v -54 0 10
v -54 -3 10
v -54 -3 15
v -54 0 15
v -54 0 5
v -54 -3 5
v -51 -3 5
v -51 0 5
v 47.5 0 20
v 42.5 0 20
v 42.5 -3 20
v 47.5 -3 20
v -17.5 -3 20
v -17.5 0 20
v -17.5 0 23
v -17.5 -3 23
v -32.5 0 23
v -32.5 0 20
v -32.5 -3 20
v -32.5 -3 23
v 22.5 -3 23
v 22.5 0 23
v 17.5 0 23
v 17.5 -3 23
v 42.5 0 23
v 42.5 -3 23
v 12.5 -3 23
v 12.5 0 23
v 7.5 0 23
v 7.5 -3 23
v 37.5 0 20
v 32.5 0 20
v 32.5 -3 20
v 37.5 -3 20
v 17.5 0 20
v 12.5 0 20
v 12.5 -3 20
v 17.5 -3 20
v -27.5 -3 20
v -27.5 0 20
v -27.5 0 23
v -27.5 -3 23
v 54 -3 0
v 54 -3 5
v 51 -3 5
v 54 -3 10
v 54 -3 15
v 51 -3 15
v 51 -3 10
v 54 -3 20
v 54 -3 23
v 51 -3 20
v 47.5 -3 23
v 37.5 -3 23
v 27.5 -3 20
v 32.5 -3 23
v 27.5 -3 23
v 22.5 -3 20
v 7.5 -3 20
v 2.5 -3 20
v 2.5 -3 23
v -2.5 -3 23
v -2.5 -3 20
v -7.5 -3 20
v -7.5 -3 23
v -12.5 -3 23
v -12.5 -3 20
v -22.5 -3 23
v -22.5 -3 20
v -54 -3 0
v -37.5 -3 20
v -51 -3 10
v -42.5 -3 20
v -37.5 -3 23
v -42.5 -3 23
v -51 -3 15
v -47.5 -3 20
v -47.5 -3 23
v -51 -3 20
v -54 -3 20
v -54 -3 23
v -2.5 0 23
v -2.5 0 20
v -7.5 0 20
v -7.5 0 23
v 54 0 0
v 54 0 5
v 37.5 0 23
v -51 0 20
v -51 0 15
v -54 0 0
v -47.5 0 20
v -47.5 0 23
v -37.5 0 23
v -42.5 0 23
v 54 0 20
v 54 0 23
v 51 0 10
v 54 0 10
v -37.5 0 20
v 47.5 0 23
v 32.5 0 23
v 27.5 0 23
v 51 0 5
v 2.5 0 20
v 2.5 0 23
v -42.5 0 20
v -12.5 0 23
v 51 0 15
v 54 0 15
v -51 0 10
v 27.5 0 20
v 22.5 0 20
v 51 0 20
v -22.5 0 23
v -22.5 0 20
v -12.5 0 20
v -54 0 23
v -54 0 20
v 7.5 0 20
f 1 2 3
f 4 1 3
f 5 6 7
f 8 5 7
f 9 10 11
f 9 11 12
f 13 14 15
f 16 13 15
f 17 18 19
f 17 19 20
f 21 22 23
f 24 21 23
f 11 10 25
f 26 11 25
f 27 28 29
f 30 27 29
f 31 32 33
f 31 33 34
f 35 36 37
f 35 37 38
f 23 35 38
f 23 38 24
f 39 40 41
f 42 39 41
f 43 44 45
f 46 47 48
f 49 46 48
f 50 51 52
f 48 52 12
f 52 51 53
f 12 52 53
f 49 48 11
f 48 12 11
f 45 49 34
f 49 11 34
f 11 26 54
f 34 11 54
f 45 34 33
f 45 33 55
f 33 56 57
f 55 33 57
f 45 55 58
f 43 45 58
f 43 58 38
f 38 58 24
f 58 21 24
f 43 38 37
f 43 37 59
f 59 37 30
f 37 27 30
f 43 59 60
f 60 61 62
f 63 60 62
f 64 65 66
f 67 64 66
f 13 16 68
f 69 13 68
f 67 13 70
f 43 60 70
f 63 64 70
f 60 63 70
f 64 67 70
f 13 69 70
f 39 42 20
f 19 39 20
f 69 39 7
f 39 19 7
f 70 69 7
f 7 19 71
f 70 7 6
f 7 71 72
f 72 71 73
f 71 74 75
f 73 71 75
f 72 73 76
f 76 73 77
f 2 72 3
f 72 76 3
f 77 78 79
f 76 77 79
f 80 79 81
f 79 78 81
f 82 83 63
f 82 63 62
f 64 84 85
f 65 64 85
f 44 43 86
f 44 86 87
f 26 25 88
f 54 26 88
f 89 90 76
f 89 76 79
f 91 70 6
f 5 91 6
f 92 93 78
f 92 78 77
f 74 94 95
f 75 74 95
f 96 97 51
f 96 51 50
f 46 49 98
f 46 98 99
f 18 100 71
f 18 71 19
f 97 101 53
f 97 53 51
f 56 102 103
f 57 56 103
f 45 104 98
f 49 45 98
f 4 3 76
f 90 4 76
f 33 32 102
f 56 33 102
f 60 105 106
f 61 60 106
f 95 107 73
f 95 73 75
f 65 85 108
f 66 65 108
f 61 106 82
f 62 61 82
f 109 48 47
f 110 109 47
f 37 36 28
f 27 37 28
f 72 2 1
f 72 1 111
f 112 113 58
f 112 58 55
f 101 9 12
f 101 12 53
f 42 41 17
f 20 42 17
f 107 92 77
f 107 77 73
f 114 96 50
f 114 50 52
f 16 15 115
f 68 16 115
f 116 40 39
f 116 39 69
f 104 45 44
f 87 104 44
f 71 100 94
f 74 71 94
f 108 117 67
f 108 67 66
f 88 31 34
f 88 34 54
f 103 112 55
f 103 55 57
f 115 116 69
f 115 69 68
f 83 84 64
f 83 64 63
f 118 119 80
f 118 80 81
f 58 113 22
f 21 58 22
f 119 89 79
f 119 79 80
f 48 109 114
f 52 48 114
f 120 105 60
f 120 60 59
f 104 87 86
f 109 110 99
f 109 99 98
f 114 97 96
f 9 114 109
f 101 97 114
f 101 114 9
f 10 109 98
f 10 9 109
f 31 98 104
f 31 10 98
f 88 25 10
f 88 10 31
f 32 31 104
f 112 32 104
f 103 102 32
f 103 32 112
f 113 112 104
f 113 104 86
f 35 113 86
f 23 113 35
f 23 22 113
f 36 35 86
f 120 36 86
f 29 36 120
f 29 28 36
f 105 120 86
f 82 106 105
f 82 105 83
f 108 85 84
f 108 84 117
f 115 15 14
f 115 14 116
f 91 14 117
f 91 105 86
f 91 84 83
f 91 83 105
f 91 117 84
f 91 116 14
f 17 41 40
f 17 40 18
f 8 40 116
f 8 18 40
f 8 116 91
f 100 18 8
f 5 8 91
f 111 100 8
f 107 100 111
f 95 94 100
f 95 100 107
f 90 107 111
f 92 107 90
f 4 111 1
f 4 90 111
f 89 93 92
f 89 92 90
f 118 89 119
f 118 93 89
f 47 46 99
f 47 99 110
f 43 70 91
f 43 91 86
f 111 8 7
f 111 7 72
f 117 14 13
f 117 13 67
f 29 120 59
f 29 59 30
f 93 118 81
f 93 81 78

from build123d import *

# Parameters (mm, degrees)
F0_W     = 102
F0_H     = 40
F1_DEPTH = 3
F2_W     = 3
F2_H     = 5
F3_DEPTH = 3
F4_W     = 5
F4_H     = 3
F5_DEPTH = 3
F6_W     = 108
F6_H     = 20
F7_DEPTH = 25


with BuildPart() as f1:
    # F0 (on Front) → F1 (new body)
    with BuildSketch(Plane.XZ):
        Rectangle(F0_W, F0_H)
    extrude(amount=F1_DEPTH)

    # F2 (on face) → F3 (join)
    with BuildSketch(Plane.XZ.offset(3)):
        with Locations((-52.5, -17.5)):
            Rectangle(F2_W, F2_H)
        with Locations((-52.5, -7.5)):
            Rectangle(F2_W, F2_H)
        with Locations((-52.5, 2.5)):
            Rectangle(F2_W, F2_H)
        with Locations((-52.5, 12.5)):
            Rectangle(F2_W, F2_H)
        with Locations((52.5, -7.5)):
            Rectangle(F2_W, F2_H)
        with Locations((52.5, -17.5)):
            Rectangle(F2_W, F2_H)
        with Locations((52.5, 12.5)):
            Rectangle(F2_W, F2_H)
        with Locations((52.5, 2.5)):
            Rectangle(F2_W, F2_H)
    extrude(amount=-F3_DEPTH)

    # F4 (on face) → F5 (join)
    with BuildSketch(Plane(origin=(0, 0, 0), x_dir=(-1, 0, 0), z_dir=(0, 1, 0))):
        with Locations((0, 21.5)):
            Rectangle(F4_W, F4_H)
        with Locations((10, 21.5)):
            Rectangle(F4_W, F4_H)
        with Locations((20, 21.5)):
            Rectangle(F4_W, F4_H)
        with Locations((30, 21.5)):
            Rectangle(F4_W, F4_H)
        with Locations((40, 21.5)):
            Rectangle(F4_W, F4_H)
        Polygon((52.5, 23), (47.5, 23), (47.5, 20), (52.5, 20), (54, 20), (54, 23), align=None)
        Polygon((-52.5, 20), (-47.5, 20), (-47.5, 23), (-52.5, 23), (-54, 23), (-54, 20), align=None)
        with Locations((-20, 21.5)):
            Rectangle(F4_W, F4_H)
        with Locations((-10, 21.5)):
            Rectangle(F4_W, F4_H)
        with Locations((-30, 21.5)):
            Rectangle(F4_W, F4_H)
        with Locations((-40, 21.5)):
            Rectangle(F4_W, F4_H)
    extrude(amount=-F5_DEPTH)

    # F6 (on face) → F7 (cut)
    with BuildSketch(Plane(origin=(0, 0, 0), x_dir=(-1, 0, 0), z_dir=(0, 1, 0))):
        with Locations((0, -10)):
            Rectangle(F6_W, F6_H)
    extrude(amount=-F7_DEPTH, mode=Mode.SUBTRACT)


solid = f1.part
